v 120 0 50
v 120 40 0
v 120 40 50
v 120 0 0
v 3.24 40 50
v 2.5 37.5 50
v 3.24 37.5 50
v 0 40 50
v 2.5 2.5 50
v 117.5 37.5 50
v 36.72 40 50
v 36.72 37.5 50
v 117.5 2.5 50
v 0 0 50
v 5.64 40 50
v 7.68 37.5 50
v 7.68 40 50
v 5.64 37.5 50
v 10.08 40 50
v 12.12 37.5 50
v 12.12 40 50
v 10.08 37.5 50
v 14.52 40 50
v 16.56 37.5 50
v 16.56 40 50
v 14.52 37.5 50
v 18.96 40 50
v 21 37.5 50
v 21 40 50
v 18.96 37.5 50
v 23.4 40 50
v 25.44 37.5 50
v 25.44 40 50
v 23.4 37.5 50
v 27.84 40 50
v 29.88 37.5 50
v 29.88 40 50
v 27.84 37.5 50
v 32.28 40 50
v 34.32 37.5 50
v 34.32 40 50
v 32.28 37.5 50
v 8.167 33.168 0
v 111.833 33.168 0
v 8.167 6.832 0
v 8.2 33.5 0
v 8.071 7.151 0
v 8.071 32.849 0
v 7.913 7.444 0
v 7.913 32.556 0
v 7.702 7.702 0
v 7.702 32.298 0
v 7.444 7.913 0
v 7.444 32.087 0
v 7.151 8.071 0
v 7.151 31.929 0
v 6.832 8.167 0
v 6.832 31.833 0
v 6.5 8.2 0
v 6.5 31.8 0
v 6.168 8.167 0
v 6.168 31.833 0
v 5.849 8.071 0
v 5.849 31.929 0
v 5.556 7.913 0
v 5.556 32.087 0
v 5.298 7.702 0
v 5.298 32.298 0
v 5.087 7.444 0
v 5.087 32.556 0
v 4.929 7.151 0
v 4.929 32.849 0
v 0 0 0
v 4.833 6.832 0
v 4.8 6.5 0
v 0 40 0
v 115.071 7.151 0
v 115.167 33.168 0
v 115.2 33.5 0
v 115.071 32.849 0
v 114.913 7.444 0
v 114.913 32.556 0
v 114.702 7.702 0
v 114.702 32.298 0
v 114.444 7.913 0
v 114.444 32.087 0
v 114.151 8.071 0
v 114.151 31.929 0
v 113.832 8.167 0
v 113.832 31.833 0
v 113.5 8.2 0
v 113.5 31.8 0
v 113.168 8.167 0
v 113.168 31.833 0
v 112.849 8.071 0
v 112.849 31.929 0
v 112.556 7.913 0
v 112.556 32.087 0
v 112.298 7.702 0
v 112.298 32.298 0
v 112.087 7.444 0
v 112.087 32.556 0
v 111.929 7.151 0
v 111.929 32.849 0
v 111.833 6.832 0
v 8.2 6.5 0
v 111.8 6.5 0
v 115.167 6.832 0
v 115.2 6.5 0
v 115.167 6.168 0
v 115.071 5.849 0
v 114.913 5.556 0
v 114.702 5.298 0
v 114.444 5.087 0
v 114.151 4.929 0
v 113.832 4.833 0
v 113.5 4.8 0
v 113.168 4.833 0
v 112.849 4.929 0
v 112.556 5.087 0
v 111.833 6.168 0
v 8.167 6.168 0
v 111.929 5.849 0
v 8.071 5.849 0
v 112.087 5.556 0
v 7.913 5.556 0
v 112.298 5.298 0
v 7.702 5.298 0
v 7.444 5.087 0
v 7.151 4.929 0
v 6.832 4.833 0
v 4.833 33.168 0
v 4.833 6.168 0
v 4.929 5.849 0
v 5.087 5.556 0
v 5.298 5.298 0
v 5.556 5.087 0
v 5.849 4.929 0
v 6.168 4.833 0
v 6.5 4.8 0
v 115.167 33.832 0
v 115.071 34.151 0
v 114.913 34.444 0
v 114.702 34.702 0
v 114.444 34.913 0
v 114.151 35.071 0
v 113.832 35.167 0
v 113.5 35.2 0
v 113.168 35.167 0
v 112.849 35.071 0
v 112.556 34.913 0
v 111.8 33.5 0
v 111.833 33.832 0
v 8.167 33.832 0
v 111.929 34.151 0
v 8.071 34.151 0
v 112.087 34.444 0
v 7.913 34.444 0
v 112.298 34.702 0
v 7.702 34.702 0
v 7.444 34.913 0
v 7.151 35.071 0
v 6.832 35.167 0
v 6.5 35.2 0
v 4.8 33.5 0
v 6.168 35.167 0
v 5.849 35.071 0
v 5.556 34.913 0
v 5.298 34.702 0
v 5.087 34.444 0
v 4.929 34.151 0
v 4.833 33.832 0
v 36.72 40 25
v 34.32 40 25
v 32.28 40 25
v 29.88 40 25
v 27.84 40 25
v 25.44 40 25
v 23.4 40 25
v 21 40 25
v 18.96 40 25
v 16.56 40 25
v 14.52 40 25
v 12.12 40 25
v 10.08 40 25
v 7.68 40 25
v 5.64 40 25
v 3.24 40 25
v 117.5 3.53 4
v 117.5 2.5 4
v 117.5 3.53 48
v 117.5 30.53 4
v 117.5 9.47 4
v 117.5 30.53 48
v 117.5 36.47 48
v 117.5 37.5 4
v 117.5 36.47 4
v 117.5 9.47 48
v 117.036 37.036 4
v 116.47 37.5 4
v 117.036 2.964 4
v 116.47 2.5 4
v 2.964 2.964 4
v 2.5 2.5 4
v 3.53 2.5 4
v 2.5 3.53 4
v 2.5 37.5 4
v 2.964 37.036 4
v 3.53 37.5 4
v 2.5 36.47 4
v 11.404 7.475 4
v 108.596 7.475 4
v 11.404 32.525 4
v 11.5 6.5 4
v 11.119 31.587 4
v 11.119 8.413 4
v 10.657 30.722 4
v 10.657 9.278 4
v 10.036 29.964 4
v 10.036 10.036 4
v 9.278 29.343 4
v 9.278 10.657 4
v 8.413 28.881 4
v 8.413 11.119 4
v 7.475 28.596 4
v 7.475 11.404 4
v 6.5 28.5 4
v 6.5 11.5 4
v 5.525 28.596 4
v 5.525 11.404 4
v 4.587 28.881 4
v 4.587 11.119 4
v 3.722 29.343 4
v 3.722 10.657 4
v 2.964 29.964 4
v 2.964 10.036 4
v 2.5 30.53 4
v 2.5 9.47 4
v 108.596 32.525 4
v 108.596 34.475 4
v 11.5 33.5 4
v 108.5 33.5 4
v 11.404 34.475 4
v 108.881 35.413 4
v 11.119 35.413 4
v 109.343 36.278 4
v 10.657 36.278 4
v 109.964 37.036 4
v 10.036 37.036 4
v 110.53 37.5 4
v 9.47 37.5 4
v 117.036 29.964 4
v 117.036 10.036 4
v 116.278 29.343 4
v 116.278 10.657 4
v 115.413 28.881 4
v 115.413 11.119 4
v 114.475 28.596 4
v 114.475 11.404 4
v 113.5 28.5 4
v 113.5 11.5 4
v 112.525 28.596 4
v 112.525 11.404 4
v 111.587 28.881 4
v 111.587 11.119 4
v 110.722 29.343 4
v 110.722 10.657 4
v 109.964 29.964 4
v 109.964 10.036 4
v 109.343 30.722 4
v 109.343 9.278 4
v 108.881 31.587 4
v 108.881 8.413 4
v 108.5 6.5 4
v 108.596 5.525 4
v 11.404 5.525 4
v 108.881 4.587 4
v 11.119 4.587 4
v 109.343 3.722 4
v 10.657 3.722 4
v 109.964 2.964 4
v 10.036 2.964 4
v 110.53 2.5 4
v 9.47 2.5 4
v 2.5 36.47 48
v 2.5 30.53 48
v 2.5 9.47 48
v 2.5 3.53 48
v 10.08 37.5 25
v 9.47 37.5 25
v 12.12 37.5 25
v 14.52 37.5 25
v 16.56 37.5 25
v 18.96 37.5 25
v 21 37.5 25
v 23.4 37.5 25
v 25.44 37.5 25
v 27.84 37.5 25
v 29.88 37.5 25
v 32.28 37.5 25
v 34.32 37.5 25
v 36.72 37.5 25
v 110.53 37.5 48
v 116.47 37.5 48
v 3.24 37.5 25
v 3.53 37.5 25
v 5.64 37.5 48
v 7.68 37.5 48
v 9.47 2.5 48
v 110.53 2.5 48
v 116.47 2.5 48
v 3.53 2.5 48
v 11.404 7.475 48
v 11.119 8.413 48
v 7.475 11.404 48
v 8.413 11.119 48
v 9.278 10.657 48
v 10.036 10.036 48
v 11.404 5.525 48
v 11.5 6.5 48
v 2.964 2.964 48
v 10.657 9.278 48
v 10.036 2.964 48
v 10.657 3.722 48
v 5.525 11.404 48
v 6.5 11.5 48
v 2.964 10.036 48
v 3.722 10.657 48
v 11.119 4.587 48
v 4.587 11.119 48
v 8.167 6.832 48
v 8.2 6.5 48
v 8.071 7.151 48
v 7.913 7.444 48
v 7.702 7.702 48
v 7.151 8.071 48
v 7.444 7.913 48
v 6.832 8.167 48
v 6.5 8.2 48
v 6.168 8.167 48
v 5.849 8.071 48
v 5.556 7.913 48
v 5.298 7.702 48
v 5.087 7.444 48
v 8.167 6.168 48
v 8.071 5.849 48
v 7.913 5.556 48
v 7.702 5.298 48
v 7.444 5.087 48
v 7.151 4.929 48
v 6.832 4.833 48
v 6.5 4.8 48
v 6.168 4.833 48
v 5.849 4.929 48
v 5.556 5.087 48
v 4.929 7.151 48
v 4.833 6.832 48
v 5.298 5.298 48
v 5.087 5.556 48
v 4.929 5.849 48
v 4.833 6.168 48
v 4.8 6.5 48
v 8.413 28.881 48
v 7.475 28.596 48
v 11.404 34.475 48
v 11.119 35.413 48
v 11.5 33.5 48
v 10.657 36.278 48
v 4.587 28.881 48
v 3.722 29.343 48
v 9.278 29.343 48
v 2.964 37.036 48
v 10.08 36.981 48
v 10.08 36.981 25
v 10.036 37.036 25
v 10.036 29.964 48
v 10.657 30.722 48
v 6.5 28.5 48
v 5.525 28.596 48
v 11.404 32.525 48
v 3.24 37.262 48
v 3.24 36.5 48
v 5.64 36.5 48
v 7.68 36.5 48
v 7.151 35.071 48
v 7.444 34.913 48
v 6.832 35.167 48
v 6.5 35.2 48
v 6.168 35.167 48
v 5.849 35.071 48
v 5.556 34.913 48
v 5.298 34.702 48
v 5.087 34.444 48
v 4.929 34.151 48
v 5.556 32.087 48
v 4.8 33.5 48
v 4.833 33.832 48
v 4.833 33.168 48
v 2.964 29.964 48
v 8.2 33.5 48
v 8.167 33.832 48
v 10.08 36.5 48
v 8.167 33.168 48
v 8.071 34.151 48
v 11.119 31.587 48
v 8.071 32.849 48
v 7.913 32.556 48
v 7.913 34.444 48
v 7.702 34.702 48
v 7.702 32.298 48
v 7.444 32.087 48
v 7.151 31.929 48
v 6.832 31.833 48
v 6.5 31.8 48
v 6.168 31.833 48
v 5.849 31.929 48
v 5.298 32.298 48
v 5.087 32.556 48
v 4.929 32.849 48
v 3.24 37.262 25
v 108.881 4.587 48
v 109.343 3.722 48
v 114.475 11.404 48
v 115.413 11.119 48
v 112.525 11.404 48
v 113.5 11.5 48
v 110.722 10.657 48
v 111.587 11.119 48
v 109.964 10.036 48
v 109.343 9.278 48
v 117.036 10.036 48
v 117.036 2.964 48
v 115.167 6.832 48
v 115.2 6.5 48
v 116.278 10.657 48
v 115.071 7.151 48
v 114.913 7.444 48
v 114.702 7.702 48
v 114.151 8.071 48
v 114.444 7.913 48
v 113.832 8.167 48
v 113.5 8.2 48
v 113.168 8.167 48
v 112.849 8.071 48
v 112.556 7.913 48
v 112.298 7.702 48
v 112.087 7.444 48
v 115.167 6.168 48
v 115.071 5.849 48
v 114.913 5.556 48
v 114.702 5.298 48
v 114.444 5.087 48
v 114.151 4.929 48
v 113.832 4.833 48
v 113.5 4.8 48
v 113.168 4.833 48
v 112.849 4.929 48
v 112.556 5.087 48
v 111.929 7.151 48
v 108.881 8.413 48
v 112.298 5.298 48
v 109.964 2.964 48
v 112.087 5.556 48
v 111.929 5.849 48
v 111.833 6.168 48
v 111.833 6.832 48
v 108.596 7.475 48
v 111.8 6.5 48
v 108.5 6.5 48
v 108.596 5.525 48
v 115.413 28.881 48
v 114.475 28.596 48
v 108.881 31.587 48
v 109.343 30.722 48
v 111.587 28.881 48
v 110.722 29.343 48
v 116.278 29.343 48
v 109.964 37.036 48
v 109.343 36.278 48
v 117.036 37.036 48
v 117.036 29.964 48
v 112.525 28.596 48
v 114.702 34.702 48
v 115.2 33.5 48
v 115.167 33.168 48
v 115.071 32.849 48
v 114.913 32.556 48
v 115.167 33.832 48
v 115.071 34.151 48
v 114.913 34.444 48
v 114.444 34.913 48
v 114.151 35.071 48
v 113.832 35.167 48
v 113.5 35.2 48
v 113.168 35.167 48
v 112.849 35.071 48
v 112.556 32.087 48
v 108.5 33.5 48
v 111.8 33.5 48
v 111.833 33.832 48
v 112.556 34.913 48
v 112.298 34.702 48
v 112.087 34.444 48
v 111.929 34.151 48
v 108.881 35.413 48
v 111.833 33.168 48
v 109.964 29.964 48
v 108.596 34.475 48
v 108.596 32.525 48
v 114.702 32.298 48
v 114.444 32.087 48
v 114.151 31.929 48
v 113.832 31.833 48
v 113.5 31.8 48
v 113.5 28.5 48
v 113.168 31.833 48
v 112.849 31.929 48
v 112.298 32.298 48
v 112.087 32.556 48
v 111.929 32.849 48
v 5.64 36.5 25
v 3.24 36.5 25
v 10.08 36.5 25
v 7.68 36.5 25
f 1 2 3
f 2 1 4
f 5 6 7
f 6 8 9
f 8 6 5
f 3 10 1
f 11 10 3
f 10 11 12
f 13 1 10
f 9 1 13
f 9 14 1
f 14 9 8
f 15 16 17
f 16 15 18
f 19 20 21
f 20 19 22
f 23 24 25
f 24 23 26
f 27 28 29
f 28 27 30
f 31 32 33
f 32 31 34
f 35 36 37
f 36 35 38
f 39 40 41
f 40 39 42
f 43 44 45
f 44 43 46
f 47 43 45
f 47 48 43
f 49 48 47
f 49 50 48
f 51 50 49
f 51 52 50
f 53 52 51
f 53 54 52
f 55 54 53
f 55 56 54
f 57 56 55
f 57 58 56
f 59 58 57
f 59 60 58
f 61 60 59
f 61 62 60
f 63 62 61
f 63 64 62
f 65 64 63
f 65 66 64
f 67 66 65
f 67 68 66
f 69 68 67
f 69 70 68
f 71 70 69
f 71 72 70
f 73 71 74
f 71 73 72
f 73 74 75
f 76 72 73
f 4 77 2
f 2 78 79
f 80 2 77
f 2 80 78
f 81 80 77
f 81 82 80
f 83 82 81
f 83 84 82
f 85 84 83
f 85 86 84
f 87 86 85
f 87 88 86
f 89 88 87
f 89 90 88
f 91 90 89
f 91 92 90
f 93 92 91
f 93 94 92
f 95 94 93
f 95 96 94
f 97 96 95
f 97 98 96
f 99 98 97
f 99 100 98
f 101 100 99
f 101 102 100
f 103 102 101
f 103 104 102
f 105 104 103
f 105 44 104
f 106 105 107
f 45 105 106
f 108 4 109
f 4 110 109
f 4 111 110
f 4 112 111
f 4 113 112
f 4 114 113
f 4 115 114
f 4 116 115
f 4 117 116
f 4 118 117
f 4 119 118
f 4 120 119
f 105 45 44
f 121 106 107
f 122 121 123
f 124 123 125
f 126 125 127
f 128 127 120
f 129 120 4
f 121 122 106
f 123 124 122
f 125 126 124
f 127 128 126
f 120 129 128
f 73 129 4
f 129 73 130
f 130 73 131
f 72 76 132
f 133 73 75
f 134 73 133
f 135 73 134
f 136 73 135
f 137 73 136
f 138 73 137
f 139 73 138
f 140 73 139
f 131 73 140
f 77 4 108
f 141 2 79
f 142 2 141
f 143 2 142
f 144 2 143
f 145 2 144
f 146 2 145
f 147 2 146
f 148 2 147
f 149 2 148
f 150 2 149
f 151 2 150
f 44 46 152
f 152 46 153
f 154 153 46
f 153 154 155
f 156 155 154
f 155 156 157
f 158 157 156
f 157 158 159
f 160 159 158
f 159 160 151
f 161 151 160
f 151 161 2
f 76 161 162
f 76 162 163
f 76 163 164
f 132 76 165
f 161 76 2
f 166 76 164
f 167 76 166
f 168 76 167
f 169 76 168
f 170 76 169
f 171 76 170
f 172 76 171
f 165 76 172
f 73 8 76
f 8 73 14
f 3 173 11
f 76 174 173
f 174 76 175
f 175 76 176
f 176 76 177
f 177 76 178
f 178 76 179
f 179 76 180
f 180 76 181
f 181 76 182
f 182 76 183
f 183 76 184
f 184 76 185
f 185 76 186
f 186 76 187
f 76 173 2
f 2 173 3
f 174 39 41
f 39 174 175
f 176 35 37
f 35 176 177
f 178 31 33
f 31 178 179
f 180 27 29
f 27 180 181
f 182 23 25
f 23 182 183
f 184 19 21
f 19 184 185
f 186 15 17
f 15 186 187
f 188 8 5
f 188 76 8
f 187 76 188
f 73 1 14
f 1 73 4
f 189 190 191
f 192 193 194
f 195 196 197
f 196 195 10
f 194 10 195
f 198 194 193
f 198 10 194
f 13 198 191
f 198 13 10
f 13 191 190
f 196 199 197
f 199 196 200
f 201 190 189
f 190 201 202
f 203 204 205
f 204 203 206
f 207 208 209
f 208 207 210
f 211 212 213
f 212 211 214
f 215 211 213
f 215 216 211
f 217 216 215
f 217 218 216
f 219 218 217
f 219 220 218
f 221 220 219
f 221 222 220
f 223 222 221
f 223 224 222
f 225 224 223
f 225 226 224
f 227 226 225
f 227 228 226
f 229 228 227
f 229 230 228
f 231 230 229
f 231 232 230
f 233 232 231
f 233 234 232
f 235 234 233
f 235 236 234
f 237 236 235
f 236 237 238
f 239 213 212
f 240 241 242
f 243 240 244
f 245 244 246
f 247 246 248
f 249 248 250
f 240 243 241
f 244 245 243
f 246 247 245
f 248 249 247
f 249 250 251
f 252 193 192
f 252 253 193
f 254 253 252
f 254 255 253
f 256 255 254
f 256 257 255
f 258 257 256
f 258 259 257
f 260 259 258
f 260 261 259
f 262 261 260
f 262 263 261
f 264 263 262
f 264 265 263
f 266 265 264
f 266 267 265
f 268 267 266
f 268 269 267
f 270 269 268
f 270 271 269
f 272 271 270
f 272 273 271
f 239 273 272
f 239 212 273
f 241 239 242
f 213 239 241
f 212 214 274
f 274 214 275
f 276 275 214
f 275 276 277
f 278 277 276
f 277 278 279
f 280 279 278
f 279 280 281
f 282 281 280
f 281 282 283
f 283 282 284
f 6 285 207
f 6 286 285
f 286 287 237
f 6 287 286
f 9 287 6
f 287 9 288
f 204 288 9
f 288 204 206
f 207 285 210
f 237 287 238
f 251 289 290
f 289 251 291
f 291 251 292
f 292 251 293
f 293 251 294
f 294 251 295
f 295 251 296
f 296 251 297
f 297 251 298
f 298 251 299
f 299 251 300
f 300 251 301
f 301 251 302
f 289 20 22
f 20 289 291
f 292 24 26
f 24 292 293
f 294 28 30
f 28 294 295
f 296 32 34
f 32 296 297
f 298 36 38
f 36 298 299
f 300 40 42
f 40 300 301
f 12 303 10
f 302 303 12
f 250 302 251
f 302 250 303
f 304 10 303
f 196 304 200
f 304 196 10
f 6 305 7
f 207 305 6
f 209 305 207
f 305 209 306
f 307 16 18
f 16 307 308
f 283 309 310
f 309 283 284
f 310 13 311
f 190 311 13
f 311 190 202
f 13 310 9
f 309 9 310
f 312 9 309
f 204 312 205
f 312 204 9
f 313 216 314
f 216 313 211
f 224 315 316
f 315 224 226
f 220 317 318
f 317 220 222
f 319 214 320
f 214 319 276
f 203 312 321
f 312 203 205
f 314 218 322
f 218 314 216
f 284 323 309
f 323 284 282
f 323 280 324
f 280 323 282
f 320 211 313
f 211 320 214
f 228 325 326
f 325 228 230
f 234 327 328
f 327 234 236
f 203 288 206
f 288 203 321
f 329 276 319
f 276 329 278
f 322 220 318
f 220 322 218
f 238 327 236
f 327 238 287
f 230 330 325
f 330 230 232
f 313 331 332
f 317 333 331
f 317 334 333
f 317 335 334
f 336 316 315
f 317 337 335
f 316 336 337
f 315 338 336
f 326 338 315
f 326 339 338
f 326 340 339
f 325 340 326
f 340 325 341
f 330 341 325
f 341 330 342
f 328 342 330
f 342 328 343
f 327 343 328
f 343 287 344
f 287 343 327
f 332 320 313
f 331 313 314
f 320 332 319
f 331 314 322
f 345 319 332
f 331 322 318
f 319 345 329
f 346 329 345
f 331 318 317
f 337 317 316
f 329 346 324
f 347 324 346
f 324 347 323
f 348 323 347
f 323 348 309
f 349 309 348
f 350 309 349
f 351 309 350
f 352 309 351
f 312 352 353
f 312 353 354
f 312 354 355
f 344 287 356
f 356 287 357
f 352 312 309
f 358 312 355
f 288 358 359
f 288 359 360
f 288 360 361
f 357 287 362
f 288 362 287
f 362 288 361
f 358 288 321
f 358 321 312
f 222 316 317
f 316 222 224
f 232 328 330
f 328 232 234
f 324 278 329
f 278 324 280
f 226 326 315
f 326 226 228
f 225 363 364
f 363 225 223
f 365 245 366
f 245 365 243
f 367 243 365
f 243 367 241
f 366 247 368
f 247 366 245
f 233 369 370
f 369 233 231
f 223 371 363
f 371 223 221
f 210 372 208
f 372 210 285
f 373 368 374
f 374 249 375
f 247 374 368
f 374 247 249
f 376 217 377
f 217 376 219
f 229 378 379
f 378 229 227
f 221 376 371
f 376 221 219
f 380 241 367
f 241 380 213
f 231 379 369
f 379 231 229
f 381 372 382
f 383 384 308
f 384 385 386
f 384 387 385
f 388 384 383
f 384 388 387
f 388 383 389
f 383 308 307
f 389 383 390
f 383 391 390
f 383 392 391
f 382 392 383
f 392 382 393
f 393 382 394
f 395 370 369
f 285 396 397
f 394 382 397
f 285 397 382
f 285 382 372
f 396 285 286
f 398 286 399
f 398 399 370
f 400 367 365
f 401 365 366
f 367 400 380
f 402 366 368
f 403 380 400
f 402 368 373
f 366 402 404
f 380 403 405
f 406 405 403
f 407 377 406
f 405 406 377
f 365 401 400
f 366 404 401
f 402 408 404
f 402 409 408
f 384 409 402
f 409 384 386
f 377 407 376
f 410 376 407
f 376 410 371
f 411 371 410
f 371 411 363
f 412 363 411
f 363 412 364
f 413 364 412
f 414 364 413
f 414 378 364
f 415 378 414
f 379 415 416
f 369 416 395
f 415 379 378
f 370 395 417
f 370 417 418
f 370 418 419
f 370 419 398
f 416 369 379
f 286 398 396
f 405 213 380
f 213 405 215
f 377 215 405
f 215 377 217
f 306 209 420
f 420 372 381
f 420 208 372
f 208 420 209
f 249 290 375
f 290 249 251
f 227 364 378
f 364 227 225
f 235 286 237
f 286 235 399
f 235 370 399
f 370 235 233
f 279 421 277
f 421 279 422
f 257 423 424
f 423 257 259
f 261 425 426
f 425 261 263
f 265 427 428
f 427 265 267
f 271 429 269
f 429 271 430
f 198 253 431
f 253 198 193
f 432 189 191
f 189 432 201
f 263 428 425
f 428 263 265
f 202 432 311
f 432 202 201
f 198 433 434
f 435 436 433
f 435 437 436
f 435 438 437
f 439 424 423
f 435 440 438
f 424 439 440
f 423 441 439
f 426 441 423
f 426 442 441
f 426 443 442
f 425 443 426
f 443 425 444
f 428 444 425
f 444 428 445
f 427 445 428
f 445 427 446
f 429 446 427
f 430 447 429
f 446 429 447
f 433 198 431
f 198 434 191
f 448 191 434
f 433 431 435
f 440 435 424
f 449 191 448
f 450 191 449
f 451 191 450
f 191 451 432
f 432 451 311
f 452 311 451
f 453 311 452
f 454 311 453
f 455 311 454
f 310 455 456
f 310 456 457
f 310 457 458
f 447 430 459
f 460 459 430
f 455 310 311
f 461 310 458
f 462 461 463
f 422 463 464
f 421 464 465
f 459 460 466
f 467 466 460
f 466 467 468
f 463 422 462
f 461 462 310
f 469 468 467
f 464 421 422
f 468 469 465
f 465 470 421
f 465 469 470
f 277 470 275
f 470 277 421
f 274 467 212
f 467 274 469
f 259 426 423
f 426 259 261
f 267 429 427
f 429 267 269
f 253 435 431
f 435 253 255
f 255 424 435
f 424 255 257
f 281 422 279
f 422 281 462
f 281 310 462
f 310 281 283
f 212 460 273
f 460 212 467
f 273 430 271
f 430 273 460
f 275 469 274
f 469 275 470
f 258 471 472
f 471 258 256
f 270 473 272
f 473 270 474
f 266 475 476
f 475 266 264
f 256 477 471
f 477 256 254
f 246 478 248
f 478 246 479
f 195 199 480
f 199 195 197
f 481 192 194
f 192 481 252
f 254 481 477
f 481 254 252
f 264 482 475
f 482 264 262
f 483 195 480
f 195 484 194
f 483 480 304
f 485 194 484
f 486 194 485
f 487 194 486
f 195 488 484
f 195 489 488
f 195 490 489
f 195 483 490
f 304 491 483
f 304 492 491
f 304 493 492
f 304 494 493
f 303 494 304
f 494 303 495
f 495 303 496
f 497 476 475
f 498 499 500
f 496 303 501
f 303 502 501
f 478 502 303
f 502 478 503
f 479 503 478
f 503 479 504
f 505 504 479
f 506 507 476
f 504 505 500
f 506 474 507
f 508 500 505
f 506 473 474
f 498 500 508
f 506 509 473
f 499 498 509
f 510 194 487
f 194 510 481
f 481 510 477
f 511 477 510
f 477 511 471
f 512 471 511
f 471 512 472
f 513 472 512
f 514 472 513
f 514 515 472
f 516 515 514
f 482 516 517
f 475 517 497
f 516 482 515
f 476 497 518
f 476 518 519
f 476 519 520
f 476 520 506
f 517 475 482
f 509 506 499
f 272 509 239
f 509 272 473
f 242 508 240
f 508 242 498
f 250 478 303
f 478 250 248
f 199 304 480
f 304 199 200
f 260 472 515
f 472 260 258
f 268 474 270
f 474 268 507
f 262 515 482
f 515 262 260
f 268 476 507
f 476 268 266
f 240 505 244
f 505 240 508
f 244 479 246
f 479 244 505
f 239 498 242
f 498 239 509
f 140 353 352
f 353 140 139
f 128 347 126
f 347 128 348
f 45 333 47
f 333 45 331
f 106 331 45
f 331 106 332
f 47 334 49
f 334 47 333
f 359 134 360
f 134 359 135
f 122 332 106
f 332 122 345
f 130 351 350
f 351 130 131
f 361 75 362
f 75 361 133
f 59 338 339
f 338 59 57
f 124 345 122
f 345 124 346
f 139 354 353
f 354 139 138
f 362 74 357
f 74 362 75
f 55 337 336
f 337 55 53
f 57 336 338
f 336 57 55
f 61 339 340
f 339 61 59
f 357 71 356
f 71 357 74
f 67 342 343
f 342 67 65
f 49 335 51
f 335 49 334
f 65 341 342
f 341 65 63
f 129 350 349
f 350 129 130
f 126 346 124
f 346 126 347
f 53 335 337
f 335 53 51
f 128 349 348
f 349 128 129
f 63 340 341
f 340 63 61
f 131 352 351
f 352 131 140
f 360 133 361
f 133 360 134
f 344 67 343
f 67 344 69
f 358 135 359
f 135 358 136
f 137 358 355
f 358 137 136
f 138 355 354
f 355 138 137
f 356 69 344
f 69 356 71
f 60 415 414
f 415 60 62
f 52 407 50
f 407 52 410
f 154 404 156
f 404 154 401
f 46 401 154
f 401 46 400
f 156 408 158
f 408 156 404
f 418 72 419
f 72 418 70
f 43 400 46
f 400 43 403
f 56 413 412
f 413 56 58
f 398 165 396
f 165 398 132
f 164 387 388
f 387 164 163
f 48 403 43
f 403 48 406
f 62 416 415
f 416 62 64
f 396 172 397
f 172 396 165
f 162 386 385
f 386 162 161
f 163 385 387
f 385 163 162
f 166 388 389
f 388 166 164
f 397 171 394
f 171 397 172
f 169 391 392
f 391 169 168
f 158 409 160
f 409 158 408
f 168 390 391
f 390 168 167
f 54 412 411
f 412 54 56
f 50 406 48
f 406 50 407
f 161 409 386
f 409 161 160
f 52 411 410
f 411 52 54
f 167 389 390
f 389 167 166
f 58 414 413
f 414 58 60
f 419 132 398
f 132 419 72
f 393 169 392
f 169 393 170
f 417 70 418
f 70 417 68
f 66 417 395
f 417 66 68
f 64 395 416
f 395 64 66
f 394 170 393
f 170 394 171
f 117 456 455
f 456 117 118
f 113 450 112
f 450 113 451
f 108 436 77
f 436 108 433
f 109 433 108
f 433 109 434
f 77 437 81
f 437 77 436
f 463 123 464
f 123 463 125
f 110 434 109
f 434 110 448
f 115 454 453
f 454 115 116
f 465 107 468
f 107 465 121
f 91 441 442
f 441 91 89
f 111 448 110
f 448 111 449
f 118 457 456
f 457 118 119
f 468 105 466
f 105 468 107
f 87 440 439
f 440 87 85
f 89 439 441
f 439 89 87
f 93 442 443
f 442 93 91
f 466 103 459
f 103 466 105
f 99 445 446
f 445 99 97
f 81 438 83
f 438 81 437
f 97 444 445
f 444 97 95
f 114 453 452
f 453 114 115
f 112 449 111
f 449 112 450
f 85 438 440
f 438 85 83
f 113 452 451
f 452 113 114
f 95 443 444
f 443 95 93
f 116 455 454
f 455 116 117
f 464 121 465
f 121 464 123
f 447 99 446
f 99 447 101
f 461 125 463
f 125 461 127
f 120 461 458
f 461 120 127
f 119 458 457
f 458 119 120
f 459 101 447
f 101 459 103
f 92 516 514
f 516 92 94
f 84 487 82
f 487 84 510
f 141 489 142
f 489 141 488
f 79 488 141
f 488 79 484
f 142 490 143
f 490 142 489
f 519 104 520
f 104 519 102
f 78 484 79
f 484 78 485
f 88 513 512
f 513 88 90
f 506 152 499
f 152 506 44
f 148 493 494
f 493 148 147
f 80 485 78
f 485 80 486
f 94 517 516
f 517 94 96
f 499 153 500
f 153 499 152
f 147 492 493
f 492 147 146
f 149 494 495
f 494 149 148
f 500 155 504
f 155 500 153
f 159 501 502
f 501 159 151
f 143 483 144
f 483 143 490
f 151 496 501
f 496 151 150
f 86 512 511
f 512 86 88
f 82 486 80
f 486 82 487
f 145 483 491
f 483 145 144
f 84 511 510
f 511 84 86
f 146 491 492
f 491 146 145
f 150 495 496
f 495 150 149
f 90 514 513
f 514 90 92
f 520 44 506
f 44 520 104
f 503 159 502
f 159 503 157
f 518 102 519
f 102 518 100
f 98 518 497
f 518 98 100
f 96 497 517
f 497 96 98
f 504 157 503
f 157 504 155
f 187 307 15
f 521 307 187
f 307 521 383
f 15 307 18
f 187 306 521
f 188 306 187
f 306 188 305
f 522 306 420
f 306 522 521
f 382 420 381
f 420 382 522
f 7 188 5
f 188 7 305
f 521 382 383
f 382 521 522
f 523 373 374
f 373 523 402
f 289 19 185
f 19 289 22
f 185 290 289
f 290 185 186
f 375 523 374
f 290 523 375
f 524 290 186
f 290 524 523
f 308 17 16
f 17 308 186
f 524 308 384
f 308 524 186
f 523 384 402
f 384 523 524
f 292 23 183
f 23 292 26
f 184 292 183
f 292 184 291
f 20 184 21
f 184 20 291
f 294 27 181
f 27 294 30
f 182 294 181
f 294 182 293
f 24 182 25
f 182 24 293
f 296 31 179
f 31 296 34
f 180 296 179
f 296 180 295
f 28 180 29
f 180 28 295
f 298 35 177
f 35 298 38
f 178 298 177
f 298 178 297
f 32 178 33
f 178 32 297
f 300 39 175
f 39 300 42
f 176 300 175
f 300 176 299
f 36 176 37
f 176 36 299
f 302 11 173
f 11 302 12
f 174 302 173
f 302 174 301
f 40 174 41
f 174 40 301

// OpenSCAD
$fn = 32;

// ----------------------------------------------------------------------
// Enclosure body: 120 x 40 x 50 mm, wall 2.5 mm
// ----------------------------------------------------------------------

// --- parameters (mm) ---
length = 120;             // outside length, X
width = 40;               // outside width, Y
height = 50;              // outside height, Z
wall = 2.5;               // side wall thickness
floor_t = 4;              // floor thickness
boss_d = 10;              // corner boss diameter
boss_h = 44;              // corner boss height above the floor
boss_hole_d = 3.4;        // lid screw clearance in the boss
boss_lip = 6.5;           // boss centre inset from the corner
vent_slots = 8;           // vent slots in the long wall
vent_w = 2.4;             // vent slot width
vent_h = 25;              // vent slot height
vent_pitch = 4.44;        // vent slot pitch
vent_z = 25;              // vent slot sill height

module shell() {
  difference() {
    cube([length, width, height]);
    /* hollow, open at the top */
    translate([wall, wall, floor_t])
      cube([length - 2 * wall, width - 2 * wall, height]);
  }
}

module bosses() {
  /* corner bosses, sunk 1 mm into the floor */
  for (sx = [0, 1]) for (sy = [0, 1])
    translate([sx * (length - 2 * boss_lip) + boss_lip, sy * (width - 2 * boss_lip) + boss_lip, floor_t - 1])
      cylinder(h = boss_h + 1, d = boss_d);
}

difference() {
  union() {
    shell();
    bosses();
  }
  /* boss screw holes */
  for (sx = [0, 1]) for (sy = [0, 1])
    translate([sx * (length - 2 * boss_lip) + boss_lip, sy * (width - 2 * boss_lip) + boss_lip, -1]) cylinder(h = floor_t + boss_h + 2, d = boss_hole_d);
  /* vent grille in the +Y wall */
  for (i = [0 : vent_slots - 1]) translate([vent_pitch * (i + 1) - vent_w / 2, width - wall - 1, vent_z]) cube([vent_w, wall + 2, vent_h]);
}
